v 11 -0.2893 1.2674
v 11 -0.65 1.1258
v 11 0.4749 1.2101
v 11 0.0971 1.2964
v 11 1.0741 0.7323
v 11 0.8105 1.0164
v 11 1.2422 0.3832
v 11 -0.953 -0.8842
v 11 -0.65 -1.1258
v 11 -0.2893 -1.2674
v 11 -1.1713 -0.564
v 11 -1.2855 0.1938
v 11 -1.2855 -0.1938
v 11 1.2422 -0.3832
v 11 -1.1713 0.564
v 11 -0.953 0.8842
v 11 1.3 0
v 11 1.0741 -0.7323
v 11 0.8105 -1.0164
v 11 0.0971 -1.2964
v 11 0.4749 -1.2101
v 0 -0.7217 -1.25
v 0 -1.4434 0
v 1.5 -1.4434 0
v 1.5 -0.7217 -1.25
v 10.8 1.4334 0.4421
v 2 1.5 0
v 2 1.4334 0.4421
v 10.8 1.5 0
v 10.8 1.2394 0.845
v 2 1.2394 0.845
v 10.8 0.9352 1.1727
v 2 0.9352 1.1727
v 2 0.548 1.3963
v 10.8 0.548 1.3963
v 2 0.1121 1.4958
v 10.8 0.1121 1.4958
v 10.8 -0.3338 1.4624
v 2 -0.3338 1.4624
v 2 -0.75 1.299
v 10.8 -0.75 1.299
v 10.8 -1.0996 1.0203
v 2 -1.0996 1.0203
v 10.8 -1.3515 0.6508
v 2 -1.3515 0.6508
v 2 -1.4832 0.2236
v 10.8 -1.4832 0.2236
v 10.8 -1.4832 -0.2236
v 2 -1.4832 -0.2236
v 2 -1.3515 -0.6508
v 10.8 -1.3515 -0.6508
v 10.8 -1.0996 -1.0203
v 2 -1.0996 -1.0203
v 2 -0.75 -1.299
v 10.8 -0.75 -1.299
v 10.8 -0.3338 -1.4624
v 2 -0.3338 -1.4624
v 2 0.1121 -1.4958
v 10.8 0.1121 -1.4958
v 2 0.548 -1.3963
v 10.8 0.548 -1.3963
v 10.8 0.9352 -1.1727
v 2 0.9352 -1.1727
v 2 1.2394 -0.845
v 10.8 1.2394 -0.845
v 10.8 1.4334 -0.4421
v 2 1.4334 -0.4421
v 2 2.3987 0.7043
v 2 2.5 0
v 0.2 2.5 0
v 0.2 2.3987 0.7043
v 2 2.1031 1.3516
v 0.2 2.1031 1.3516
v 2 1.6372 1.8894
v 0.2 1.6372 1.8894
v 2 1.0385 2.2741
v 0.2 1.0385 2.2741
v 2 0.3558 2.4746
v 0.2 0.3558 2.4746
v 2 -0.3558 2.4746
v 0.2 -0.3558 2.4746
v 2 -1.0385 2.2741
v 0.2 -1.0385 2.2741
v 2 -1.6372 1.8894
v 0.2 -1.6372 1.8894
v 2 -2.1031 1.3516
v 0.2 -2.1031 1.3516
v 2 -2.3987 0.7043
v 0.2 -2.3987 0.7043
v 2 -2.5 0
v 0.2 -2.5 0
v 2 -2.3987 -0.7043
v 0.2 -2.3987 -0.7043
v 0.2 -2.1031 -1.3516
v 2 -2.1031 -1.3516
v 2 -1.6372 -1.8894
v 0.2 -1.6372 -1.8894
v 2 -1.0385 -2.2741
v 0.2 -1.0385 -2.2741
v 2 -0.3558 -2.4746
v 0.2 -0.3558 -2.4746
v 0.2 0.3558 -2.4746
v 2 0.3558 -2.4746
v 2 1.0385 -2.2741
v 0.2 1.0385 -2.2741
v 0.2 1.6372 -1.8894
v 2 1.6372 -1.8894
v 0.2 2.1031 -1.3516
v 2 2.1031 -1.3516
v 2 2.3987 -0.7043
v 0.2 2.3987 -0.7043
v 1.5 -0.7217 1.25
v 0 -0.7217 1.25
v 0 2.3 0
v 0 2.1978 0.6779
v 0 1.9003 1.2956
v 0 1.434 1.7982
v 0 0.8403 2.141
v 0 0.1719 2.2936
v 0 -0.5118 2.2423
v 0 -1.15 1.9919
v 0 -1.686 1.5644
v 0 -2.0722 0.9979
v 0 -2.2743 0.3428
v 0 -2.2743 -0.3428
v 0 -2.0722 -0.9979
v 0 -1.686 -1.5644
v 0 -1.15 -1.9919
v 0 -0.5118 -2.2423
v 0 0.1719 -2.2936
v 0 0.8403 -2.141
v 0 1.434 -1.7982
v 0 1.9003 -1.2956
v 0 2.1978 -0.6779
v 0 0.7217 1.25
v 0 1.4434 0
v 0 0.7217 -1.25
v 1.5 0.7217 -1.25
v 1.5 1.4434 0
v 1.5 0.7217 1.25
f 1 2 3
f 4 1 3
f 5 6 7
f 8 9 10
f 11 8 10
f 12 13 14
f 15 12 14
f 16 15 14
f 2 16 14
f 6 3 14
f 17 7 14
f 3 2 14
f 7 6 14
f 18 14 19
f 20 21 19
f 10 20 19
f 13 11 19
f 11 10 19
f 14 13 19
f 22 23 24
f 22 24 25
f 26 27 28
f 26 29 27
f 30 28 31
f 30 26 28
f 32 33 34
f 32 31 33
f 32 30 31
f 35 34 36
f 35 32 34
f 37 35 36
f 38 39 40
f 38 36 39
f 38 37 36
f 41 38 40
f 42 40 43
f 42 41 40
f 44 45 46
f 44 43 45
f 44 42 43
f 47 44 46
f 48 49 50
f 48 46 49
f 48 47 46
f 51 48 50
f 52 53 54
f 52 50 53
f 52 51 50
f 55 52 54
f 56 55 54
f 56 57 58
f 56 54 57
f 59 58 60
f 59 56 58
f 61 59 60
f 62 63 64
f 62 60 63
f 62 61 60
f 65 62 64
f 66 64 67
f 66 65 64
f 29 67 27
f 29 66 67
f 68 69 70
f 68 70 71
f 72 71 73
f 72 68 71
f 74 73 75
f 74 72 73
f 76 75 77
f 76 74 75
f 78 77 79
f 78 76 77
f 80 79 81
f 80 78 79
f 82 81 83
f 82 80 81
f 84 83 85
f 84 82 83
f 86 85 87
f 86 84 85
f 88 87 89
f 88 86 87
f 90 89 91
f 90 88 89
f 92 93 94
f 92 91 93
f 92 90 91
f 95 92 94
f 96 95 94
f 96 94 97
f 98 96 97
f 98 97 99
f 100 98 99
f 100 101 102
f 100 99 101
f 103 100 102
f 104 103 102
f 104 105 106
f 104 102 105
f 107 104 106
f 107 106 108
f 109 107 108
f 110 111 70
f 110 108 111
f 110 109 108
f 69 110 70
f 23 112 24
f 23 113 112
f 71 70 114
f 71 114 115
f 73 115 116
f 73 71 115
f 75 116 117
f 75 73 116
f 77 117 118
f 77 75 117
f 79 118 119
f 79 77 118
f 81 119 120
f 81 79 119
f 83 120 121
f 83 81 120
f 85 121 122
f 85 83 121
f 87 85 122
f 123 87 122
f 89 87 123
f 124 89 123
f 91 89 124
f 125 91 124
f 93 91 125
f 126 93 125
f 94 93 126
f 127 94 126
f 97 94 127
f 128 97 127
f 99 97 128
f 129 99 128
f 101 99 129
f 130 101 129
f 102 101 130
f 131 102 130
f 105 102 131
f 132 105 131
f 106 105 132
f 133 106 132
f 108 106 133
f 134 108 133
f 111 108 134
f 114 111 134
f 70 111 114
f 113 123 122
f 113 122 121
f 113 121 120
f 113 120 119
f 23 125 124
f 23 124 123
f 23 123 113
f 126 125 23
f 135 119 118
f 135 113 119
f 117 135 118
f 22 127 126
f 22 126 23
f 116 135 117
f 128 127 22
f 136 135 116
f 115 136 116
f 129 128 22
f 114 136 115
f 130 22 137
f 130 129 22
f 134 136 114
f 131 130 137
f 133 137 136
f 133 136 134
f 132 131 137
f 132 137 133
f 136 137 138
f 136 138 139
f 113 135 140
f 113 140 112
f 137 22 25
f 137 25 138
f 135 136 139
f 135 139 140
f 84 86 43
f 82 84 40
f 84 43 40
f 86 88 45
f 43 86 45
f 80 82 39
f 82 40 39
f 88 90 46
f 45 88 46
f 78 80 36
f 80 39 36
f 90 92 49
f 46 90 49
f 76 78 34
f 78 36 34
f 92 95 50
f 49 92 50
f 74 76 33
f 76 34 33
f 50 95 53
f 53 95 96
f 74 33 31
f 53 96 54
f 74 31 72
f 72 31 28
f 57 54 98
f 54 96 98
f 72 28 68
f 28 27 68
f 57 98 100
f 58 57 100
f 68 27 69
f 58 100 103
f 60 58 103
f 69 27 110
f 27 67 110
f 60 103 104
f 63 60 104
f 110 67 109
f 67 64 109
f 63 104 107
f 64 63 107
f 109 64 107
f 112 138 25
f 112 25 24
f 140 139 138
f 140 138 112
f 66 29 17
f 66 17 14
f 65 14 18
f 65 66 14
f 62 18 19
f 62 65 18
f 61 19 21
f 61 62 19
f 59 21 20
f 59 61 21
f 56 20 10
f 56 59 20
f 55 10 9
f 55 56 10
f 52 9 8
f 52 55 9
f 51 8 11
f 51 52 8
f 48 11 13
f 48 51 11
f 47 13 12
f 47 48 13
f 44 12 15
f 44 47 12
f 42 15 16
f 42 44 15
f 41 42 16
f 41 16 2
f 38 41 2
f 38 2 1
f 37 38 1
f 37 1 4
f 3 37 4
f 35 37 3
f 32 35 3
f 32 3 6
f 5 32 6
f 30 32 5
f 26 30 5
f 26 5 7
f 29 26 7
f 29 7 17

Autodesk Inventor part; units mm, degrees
ref_plane "YZ Plane" through (0, 0, 0) normal (1, 0, 0) x (0, 1, 0)
ref_plane "XZ Plane" through (0, 0, 0) normal (0, 1, 0) x (-1, 0, 0)
ref_plane "XY Plane" through (0, 0, 0) normal (0, 0, 1) x (1, 0, 0)
sketch "Sketch15" plane through (0, 0, 0) normal (0, 0, 1) x (1, 0, 0)
  line L0 (0, 0) -> (0, 2.5)
  line L1 (0, 2.5) -> (2, 2.5)
  line L2 (3, 4.4) -> (3, 4.4)
  line L3 (2, 1.5) -> (11, 1.5)
  line L4 (11, 0) -> (0, 0)
  line L5 (11, 0) -> (7.2, 0)
  line L6 (2, 1.5) -> (2, 2.5)
  line L7 (11, 1.5) -> (11, 0)
  dimension "d84" = 1.5
  dimension "d87" = 2.5
  dimension "d116" = 2
  dimension "d117" = 9
revolve "Revolution1" add sketch "Sketch15" angle 360 about axis through (11, 0, 0) along (-1, 0, 0)
chamfer "Chamfer5" distance 0.2 angle 45 1 edges at (11, -1.5, 0)
thread "Thread8" size "M3x0.5" class "6g" standard "ANSI Metric M Profile" full length
sketch "Sketch20" plane through (0, 0, 0) normal (-1, 0, 0) x (0, 0, 1)
  line L0 (-1.25, 0.7217) -> (0, 1.4434)
  line L1 (0, 1.4434) -> (1.25, 0.7217)
  line L2 (1.25, 0.7217) -> (1.25, -0.7217)
  line L3 (1.25, -0.7217) -> (0, -1.4434)
  line L4 (0, -1.4434) -> (-1.25, -0.7217)
  line L5 (-1.25, -0.7217) -> (-1.25, 0.7217)
  point P0 (0, 0)
  point P1 (0, 0)
  dimension "d143" = 2.5
extrude "Extrusion19" cut sketch "Sketch20" against normal blind 1.5
chamfer "Chamfer6" distance 0.2 angle 45 1 edges at (0, -2.5, 0)
properties part number "Bolt3RH"
